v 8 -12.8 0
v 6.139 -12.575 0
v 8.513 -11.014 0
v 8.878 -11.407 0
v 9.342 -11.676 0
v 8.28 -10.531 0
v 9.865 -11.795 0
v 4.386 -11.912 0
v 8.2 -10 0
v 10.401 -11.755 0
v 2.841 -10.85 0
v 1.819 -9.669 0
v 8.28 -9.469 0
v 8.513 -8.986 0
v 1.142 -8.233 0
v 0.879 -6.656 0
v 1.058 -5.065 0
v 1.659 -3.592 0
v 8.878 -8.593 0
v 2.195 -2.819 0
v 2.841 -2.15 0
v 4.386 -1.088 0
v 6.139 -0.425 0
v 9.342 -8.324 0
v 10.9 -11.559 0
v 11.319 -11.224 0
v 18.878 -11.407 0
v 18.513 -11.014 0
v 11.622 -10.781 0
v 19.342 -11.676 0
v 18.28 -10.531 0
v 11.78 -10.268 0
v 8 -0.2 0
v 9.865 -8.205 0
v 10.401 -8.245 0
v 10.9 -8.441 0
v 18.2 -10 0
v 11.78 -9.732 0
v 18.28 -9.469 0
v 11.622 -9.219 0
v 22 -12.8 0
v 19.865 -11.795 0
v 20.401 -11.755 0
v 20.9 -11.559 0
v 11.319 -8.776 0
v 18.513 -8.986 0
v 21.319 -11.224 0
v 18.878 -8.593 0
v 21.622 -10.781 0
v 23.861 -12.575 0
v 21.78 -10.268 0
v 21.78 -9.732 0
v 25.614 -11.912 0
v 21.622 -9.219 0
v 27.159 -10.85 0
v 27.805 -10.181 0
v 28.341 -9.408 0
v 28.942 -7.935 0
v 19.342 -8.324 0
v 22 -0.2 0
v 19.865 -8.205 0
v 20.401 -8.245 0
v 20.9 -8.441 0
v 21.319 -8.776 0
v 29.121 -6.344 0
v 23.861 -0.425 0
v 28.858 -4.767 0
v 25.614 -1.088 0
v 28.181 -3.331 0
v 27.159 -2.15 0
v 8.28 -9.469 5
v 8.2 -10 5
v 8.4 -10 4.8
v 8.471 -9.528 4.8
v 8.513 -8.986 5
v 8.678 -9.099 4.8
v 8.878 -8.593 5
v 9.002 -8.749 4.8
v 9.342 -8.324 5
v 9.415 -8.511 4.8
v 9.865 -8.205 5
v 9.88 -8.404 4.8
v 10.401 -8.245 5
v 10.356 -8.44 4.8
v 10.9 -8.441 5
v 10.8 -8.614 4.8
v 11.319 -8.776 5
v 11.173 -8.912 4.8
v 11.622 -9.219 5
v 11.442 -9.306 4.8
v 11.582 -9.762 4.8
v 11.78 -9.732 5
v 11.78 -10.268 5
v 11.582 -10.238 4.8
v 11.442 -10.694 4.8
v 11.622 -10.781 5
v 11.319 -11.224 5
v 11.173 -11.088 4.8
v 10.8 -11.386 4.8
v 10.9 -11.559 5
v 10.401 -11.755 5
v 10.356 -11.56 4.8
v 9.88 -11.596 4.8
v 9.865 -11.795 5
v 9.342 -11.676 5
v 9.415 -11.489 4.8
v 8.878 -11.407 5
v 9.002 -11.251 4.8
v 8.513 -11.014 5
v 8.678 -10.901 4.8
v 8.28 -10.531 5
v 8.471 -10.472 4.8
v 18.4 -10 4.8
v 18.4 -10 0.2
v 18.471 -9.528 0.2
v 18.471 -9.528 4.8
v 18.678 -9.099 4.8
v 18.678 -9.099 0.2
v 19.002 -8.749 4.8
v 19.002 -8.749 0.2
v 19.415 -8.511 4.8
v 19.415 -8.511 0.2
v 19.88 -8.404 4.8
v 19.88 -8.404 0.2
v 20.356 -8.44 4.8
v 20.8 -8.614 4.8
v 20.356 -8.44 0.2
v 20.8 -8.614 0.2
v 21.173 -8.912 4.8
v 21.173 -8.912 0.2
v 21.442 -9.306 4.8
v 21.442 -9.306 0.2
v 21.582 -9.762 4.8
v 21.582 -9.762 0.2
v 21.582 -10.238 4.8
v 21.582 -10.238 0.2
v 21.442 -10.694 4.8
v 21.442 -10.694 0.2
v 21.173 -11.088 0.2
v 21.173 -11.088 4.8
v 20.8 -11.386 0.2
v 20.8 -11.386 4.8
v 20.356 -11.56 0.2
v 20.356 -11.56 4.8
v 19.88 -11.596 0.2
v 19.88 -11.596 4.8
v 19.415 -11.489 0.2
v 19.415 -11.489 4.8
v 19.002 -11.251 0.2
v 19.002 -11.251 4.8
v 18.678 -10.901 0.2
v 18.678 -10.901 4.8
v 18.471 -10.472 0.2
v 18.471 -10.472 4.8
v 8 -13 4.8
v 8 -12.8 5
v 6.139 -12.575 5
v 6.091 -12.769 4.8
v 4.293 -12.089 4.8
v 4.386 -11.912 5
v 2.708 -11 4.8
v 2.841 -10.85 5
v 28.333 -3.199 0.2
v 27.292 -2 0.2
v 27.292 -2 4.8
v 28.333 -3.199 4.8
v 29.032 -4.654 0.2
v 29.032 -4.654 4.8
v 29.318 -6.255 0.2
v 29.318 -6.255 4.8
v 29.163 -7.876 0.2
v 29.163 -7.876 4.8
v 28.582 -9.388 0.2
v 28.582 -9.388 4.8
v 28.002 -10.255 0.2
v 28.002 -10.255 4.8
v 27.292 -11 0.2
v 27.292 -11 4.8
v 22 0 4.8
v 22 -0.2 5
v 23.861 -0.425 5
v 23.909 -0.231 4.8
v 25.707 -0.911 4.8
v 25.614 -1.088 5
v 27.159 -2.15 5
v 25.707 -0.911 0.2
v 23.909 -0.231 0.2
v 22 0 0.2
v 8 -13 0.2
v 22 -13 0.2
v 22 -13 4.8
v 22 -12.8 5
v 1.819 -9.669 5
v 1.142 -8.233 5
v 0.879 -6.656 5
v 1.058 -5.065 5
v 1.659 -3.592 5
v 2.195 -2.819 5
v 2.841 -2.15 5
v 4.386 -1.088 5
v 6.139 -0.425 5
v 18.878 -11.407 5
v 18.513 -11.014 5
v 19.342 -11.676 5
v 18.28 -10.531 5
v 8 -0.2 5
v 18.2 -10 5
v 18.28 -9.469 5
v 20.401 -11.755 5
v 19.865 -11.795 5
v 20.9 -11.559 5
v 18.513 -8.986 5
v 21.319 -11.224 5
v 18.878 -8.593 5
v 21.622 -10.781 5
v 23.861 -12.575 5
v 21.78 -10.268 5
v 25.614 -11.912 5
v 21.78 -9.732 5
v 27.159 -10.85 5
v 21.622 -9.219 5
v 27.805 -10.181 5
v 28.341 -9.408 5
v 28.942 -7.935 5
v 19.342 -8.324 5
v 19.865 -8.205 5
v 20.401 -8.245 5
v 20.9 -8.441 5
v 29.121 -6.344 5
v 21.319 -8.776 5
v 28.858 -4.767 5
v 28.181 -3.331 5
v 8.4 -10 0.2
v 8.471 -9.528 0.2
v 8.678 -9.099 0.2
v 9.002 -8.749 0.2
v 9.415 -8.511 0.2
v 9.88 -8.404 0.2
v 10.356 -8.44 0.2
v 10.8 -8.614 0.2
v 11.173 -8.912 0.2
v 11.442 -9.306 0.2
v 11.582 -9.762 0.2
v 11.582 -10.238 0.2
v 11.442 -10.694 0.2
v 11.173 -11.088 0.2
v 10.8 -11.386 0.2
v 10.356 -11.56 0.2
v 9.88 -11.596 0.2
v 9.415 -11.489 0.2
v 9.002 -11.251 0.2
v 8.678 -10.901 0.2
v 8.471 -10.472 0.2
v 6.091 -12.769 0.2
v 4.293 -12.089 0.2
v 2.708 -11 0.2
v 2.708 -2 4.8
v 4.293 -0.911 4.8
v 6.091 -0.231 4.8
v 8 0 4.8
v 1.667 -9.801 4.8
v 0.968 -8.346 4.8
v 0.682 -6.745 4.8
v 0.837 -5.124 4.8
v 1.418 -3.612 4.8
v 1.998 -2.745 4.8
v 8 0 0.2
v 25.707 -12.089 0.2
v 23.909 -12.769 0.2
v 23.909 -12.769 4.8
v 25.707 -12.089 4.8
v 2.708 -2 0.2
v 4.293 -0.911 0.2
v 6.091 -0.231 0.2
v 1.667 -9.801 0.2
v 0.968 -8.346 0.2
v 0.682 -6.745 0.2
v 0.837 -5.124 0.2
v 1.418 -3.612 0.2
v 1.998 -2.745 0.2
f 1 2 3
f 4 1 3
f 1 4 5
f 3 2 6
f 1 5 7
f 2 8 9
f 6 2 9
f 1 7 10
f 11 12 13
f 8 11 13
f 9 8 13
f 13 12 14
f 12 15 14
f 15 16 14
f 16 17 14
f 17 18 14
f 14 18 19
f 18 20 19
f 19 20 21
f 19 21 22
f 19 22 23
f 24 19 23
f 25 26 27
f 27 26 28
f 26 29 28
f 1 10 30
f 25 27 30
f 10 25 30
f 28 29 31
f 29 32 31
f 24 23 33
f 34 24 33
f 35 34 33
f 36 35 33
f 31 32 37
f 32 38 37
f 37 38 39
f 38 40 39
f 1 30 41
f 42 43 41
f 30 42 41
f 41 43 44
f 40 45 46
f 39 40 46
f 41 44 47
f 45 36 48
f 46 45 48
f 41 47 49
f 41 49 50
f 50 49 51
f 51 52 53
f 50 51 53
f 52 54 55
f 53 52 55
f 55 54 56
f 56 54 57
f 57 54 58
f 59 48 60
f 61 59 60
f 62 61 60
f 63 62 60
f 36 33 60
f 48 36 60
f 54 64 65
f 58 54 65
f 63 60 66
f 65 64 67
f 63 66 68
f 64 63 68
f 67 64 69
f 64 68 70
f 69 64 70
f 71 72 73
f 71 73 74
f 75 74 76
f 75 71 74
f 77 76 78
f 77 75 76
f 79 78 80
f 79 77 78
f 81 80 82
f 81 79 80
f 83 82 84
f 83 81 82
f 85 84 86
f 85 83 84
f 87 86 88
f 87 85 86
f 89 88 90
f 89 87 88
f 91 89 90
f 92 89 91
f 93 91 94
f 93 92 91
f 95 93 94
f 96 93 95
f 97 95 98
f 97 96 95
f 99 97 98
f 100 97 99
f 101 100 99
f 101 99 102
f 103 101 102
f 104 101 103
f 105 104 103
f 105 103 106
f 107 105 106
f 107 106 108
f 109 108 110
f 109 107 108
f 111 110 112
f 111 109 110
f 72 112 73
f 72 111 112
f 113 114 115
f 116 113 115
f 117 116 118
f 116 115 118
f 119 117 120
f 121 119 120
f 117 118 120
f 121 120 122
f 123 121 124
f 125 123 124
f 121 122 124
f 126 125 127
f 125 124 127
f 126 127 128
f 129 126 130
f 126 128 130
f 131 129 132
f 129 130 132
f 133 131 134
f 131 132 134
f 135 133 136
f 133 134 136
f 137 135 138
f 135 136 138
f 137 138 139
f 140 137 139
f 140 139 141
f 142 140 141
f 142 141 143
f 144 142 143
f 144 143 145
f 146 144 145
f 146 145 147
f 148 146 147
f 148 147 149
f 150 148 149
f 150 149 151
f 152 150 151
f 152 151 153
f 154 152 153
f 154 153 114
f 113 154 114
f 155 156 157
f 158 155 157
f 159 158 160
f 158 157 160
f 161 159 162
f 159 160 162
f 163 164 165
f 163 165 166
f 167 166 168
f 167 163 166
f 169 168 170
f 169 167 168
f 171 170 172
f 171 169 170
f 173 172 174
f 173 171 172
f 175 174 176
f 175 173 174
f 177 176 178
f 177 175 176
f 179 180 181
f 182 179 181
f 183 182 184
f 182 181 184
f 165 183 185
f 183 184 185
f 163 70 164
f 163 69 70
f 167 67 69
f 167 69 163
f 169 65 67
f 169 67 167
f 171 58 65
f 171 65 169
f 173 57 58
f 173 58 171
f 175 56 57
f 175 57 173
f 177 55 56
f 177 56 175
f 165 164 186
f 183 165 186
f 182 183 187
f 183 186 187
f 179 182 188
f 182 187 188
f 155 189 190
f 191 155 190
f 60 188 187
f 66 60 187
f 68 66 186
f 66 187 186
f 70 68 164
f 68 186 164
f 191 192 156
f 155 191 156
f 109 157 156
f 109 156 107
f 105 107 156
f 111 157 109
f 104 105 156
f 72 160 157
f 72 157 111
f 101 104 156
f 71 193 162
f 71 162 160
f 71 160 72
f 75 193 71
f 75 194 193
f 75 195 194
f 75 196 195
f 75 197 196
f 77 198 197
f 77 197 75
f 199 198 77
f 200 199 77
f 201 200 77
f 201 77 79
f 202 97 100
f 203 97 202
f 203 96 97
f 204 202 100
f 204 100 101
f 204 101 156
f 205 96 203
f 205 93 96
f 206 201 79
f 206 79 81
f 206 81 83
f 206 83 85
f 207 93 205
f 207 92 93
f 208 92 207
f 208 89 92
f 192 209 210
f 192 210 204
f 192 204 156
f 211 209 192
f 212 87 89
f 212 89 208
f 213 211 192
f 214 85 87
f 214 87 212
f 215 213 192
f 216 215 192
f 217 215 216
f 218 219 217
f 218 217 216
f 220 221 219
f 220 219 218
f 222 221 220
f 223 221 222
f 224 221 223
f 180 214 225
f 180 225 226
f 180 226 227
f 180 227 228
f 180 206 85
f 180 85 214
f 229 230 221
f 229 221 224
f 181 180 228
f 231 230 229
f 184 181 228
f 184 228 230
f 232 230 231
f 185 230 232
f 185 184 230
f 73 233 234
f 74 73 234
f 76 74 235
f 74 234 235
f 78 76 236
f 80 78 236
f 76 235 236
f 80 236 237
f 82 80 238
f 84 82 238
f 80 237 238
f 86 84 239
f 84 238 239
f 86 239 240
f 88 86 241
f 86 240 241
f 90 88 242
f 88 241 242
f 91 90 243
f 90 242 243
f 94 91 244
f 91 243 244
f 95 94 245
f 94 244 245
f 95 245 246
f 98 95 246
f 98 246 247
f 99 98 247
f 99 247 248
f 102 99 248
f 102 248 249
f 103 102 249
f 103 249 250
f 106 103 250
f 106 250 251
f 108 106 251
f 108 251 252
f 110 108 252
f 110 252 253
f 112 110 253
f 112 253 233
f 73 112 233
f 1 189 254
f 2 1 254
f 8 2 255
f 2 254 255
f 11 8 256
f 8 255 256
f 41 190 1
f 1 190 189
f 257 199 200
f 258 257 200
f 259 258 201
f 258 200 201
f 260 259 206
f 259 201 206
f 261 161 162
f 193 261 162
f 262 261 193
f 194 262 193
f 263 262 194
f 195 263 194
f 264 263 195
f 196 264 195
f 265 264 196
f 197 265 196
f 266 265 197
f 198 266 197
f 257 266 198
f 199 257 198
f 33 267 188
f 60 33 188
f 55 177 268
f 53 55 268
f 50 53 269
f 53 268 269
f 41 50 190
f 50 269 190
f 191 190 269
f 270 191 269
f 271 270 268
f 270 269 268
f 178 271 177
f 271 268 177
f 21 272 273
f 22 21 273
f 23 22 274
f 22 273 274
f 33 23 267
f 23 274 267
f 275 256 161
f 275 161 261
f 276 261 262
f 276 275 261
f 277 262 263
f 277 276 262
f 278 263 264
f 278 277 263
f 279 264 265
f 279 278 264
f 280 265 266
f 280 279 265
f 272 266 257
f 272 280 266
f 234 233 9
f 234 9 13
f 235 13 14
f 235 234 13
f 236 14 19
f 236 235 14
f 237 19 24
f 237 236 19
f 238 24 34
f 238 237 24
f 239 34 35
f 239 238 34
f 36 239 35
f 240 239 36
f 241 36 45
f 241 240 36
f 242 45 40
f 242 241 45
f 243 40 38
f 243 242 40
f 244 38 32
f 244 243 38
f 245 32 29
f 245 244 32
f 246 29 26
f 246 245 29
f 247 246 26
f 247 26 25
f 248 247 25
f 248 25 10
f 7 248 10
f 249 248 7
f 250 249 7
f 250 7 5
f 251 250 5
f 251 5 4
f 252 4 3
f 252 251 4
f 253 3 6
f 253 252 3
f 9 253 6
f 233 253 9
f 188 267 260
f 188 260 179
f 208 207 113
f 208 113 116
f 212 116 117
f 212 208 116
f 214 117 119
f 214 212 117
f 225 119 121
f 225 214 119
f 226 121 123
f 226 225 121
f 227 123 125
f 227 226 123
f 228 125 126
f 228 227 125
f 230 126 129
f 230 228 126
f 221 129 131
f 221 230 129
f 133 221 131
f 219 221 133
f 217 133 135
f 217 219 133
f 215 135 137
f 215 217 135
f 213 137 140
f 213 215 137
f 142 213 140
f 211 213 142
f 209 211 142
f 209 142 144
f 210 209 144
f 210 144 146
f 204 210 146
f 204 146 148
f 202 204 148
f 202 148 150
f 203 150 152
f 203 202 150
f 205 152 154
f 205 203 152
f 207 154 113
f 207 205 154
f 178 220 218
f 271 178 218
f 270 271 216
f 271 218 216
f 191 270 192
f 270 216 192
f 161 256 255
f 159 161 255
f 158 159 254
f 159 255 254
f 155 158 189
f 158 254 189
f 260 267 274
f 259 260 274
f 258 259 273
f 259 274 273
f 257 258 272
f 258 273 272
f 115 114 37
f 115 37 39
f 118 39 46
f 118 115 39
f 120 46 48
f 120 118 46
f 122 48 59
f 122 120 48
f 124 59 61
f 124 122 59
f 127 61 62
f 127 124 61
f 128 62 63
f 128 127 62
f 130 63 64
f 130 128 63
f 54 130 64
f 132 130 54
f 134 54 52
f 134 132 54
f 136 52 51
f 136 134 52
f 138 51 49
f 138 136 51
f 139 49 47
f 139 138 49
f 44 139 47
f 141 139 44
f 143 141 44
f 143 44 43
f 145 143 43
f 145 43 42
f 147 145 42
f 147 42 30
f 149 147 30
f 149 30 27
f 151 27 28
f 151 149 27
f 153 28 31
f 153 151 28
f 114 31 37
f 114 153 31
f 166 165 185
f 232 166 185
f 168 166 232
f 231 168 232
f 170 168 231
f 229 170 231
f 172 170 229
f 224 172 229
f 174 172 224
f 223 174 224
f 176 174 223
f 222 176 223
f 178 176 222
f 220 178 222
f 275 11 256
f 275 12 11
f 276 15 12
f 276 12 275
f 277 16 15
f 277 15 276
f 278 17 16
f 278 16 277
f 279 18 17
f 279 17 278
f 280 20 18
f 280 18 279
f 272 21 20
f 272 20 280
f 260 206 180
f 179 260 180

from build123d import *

# Parameters (mm, degrees)
SKETCH1_W           = 30
SKETCH1_H           = 13
BOSS_EXTRUDE1_DEPTH = 5
SKETCH2_R           = 1.6
CUT_EXTRUDE1_DEPTH  = 34.075670817
FILLET1_R           = 8
FILLET_2_R          = 6
CHAMFER_1_SIZE      = 0.2


with BuildPart() as part:
    # Sketch1 → Boss-Extrude1 (new body)
    with BuildSketch(Plane.XY):
        with Locations((15, -6.5)):
            Rectangle(SKETCH1_W, SKETCH1_H)
    extrude(amount=BOSS_EXTRUDE1_DEPTH)

    # Sketch2 → Cut-Extrude1 (cut, through all)
    with BuildSketch(Plane(origin=(0, 0, 0), x_dir=(-1, 0, 0), z_dir=(0, 0, -1))):
        with Locations((-20, -10)):
            Circle(SKETCH2_R)
        with Locations((-10, -10)):
            Circle(SKETCH2_R)
    extrude(amount=-CUT_EXTRUDE1_DEPTH, mode=Mode.SUBTRACT)

    # Fillet1
    # the kernel refuses this fillet: 8 mm, written as the material it takes off along each edge
    with BuildSketch(Plane(origin=(0, 0, -20), x_dir=(1, 0, 0), z_dir=(0, 0, 1)), Plane(origin=(0, -13, -20), x_dir=(0, 1, 0), z_dir=(0, 0, 1))) as fillet1_piece_1:
        with BuildLine():
            CenterArc((FILLET1_R, -FILLET1_R), FILLET1_R, 90, 90)
            Line((0, -FILLET1_R), (0, 0))
            Line((0, 0), (FILLET1_R, 0))
        make_face()
    extrude(amount=45, mode=Mode.SUBTRACT)
    with BuildSketch(Plane(origin=(30, -13, -20), x_dir=(0, 1, 0), z_dir=(0, 0, 1)), Plane(origin=(30, 0, -20), x_dir=(-1, 0, 0), z_dir=(0, 0, 1))) as fillet1_piece_2:
        with BuildLine():
            CenterArc((FILLET1_R, FILLET1_R), FILLET1_R, 180, 90)
            Line((0, FILLET1_R), (0, 0))
            Line((0, 0), (FILLET1_R, 0))
        make_face()
    extrude(amount=45, mode=Mode.SUBTRACT)

    # 圆角2
    fillet_2_edges = [part.edges().sort_by_distance(p)[0] for p in [
        (0.141883177, -6.5, 2.5),
        (29.858116823, -6.5, 2.5),
    ]]
    fillet(fillet_2_edges, radius=FILLET_2_R)

    # 倒角1
    chamfer_1_edges = [part.edges().sort_by_distance(p)[0] for p in [
        (21.6, -10, 5),
        (21.6, -10, 0),
        (11.6, -10, 5),
        (11.6, -10, 0),
        (15, 0, 0),
        (15, -13, 0),
        (24.828427125, -0.516685226, 0),
        (5.171572875, -12.483314774, 0),
        (15, 0, 5),
        (15, -13, 5),
        (24.828427125, -12.483314774, 5),
        (5.171572875, -0.516685226, 5),
        (24.828427125, -12.483314774, 0),
        (5.171572875, -12.483314774, 5),
        (24.828427125, -0.516685226, 5),
        (0.677124344, -6.5, 5),
        (29.322875656, -6.5, 5),
        (5.171572875, -0.516685226, 0),
        (0.677124344, -6.5, 0),
        (29.322875656, -6.5, 0),
    ]]
    chamfer(chamfer_1_edges, length=CHAMFER_1_SIZE)


solid = part.part
